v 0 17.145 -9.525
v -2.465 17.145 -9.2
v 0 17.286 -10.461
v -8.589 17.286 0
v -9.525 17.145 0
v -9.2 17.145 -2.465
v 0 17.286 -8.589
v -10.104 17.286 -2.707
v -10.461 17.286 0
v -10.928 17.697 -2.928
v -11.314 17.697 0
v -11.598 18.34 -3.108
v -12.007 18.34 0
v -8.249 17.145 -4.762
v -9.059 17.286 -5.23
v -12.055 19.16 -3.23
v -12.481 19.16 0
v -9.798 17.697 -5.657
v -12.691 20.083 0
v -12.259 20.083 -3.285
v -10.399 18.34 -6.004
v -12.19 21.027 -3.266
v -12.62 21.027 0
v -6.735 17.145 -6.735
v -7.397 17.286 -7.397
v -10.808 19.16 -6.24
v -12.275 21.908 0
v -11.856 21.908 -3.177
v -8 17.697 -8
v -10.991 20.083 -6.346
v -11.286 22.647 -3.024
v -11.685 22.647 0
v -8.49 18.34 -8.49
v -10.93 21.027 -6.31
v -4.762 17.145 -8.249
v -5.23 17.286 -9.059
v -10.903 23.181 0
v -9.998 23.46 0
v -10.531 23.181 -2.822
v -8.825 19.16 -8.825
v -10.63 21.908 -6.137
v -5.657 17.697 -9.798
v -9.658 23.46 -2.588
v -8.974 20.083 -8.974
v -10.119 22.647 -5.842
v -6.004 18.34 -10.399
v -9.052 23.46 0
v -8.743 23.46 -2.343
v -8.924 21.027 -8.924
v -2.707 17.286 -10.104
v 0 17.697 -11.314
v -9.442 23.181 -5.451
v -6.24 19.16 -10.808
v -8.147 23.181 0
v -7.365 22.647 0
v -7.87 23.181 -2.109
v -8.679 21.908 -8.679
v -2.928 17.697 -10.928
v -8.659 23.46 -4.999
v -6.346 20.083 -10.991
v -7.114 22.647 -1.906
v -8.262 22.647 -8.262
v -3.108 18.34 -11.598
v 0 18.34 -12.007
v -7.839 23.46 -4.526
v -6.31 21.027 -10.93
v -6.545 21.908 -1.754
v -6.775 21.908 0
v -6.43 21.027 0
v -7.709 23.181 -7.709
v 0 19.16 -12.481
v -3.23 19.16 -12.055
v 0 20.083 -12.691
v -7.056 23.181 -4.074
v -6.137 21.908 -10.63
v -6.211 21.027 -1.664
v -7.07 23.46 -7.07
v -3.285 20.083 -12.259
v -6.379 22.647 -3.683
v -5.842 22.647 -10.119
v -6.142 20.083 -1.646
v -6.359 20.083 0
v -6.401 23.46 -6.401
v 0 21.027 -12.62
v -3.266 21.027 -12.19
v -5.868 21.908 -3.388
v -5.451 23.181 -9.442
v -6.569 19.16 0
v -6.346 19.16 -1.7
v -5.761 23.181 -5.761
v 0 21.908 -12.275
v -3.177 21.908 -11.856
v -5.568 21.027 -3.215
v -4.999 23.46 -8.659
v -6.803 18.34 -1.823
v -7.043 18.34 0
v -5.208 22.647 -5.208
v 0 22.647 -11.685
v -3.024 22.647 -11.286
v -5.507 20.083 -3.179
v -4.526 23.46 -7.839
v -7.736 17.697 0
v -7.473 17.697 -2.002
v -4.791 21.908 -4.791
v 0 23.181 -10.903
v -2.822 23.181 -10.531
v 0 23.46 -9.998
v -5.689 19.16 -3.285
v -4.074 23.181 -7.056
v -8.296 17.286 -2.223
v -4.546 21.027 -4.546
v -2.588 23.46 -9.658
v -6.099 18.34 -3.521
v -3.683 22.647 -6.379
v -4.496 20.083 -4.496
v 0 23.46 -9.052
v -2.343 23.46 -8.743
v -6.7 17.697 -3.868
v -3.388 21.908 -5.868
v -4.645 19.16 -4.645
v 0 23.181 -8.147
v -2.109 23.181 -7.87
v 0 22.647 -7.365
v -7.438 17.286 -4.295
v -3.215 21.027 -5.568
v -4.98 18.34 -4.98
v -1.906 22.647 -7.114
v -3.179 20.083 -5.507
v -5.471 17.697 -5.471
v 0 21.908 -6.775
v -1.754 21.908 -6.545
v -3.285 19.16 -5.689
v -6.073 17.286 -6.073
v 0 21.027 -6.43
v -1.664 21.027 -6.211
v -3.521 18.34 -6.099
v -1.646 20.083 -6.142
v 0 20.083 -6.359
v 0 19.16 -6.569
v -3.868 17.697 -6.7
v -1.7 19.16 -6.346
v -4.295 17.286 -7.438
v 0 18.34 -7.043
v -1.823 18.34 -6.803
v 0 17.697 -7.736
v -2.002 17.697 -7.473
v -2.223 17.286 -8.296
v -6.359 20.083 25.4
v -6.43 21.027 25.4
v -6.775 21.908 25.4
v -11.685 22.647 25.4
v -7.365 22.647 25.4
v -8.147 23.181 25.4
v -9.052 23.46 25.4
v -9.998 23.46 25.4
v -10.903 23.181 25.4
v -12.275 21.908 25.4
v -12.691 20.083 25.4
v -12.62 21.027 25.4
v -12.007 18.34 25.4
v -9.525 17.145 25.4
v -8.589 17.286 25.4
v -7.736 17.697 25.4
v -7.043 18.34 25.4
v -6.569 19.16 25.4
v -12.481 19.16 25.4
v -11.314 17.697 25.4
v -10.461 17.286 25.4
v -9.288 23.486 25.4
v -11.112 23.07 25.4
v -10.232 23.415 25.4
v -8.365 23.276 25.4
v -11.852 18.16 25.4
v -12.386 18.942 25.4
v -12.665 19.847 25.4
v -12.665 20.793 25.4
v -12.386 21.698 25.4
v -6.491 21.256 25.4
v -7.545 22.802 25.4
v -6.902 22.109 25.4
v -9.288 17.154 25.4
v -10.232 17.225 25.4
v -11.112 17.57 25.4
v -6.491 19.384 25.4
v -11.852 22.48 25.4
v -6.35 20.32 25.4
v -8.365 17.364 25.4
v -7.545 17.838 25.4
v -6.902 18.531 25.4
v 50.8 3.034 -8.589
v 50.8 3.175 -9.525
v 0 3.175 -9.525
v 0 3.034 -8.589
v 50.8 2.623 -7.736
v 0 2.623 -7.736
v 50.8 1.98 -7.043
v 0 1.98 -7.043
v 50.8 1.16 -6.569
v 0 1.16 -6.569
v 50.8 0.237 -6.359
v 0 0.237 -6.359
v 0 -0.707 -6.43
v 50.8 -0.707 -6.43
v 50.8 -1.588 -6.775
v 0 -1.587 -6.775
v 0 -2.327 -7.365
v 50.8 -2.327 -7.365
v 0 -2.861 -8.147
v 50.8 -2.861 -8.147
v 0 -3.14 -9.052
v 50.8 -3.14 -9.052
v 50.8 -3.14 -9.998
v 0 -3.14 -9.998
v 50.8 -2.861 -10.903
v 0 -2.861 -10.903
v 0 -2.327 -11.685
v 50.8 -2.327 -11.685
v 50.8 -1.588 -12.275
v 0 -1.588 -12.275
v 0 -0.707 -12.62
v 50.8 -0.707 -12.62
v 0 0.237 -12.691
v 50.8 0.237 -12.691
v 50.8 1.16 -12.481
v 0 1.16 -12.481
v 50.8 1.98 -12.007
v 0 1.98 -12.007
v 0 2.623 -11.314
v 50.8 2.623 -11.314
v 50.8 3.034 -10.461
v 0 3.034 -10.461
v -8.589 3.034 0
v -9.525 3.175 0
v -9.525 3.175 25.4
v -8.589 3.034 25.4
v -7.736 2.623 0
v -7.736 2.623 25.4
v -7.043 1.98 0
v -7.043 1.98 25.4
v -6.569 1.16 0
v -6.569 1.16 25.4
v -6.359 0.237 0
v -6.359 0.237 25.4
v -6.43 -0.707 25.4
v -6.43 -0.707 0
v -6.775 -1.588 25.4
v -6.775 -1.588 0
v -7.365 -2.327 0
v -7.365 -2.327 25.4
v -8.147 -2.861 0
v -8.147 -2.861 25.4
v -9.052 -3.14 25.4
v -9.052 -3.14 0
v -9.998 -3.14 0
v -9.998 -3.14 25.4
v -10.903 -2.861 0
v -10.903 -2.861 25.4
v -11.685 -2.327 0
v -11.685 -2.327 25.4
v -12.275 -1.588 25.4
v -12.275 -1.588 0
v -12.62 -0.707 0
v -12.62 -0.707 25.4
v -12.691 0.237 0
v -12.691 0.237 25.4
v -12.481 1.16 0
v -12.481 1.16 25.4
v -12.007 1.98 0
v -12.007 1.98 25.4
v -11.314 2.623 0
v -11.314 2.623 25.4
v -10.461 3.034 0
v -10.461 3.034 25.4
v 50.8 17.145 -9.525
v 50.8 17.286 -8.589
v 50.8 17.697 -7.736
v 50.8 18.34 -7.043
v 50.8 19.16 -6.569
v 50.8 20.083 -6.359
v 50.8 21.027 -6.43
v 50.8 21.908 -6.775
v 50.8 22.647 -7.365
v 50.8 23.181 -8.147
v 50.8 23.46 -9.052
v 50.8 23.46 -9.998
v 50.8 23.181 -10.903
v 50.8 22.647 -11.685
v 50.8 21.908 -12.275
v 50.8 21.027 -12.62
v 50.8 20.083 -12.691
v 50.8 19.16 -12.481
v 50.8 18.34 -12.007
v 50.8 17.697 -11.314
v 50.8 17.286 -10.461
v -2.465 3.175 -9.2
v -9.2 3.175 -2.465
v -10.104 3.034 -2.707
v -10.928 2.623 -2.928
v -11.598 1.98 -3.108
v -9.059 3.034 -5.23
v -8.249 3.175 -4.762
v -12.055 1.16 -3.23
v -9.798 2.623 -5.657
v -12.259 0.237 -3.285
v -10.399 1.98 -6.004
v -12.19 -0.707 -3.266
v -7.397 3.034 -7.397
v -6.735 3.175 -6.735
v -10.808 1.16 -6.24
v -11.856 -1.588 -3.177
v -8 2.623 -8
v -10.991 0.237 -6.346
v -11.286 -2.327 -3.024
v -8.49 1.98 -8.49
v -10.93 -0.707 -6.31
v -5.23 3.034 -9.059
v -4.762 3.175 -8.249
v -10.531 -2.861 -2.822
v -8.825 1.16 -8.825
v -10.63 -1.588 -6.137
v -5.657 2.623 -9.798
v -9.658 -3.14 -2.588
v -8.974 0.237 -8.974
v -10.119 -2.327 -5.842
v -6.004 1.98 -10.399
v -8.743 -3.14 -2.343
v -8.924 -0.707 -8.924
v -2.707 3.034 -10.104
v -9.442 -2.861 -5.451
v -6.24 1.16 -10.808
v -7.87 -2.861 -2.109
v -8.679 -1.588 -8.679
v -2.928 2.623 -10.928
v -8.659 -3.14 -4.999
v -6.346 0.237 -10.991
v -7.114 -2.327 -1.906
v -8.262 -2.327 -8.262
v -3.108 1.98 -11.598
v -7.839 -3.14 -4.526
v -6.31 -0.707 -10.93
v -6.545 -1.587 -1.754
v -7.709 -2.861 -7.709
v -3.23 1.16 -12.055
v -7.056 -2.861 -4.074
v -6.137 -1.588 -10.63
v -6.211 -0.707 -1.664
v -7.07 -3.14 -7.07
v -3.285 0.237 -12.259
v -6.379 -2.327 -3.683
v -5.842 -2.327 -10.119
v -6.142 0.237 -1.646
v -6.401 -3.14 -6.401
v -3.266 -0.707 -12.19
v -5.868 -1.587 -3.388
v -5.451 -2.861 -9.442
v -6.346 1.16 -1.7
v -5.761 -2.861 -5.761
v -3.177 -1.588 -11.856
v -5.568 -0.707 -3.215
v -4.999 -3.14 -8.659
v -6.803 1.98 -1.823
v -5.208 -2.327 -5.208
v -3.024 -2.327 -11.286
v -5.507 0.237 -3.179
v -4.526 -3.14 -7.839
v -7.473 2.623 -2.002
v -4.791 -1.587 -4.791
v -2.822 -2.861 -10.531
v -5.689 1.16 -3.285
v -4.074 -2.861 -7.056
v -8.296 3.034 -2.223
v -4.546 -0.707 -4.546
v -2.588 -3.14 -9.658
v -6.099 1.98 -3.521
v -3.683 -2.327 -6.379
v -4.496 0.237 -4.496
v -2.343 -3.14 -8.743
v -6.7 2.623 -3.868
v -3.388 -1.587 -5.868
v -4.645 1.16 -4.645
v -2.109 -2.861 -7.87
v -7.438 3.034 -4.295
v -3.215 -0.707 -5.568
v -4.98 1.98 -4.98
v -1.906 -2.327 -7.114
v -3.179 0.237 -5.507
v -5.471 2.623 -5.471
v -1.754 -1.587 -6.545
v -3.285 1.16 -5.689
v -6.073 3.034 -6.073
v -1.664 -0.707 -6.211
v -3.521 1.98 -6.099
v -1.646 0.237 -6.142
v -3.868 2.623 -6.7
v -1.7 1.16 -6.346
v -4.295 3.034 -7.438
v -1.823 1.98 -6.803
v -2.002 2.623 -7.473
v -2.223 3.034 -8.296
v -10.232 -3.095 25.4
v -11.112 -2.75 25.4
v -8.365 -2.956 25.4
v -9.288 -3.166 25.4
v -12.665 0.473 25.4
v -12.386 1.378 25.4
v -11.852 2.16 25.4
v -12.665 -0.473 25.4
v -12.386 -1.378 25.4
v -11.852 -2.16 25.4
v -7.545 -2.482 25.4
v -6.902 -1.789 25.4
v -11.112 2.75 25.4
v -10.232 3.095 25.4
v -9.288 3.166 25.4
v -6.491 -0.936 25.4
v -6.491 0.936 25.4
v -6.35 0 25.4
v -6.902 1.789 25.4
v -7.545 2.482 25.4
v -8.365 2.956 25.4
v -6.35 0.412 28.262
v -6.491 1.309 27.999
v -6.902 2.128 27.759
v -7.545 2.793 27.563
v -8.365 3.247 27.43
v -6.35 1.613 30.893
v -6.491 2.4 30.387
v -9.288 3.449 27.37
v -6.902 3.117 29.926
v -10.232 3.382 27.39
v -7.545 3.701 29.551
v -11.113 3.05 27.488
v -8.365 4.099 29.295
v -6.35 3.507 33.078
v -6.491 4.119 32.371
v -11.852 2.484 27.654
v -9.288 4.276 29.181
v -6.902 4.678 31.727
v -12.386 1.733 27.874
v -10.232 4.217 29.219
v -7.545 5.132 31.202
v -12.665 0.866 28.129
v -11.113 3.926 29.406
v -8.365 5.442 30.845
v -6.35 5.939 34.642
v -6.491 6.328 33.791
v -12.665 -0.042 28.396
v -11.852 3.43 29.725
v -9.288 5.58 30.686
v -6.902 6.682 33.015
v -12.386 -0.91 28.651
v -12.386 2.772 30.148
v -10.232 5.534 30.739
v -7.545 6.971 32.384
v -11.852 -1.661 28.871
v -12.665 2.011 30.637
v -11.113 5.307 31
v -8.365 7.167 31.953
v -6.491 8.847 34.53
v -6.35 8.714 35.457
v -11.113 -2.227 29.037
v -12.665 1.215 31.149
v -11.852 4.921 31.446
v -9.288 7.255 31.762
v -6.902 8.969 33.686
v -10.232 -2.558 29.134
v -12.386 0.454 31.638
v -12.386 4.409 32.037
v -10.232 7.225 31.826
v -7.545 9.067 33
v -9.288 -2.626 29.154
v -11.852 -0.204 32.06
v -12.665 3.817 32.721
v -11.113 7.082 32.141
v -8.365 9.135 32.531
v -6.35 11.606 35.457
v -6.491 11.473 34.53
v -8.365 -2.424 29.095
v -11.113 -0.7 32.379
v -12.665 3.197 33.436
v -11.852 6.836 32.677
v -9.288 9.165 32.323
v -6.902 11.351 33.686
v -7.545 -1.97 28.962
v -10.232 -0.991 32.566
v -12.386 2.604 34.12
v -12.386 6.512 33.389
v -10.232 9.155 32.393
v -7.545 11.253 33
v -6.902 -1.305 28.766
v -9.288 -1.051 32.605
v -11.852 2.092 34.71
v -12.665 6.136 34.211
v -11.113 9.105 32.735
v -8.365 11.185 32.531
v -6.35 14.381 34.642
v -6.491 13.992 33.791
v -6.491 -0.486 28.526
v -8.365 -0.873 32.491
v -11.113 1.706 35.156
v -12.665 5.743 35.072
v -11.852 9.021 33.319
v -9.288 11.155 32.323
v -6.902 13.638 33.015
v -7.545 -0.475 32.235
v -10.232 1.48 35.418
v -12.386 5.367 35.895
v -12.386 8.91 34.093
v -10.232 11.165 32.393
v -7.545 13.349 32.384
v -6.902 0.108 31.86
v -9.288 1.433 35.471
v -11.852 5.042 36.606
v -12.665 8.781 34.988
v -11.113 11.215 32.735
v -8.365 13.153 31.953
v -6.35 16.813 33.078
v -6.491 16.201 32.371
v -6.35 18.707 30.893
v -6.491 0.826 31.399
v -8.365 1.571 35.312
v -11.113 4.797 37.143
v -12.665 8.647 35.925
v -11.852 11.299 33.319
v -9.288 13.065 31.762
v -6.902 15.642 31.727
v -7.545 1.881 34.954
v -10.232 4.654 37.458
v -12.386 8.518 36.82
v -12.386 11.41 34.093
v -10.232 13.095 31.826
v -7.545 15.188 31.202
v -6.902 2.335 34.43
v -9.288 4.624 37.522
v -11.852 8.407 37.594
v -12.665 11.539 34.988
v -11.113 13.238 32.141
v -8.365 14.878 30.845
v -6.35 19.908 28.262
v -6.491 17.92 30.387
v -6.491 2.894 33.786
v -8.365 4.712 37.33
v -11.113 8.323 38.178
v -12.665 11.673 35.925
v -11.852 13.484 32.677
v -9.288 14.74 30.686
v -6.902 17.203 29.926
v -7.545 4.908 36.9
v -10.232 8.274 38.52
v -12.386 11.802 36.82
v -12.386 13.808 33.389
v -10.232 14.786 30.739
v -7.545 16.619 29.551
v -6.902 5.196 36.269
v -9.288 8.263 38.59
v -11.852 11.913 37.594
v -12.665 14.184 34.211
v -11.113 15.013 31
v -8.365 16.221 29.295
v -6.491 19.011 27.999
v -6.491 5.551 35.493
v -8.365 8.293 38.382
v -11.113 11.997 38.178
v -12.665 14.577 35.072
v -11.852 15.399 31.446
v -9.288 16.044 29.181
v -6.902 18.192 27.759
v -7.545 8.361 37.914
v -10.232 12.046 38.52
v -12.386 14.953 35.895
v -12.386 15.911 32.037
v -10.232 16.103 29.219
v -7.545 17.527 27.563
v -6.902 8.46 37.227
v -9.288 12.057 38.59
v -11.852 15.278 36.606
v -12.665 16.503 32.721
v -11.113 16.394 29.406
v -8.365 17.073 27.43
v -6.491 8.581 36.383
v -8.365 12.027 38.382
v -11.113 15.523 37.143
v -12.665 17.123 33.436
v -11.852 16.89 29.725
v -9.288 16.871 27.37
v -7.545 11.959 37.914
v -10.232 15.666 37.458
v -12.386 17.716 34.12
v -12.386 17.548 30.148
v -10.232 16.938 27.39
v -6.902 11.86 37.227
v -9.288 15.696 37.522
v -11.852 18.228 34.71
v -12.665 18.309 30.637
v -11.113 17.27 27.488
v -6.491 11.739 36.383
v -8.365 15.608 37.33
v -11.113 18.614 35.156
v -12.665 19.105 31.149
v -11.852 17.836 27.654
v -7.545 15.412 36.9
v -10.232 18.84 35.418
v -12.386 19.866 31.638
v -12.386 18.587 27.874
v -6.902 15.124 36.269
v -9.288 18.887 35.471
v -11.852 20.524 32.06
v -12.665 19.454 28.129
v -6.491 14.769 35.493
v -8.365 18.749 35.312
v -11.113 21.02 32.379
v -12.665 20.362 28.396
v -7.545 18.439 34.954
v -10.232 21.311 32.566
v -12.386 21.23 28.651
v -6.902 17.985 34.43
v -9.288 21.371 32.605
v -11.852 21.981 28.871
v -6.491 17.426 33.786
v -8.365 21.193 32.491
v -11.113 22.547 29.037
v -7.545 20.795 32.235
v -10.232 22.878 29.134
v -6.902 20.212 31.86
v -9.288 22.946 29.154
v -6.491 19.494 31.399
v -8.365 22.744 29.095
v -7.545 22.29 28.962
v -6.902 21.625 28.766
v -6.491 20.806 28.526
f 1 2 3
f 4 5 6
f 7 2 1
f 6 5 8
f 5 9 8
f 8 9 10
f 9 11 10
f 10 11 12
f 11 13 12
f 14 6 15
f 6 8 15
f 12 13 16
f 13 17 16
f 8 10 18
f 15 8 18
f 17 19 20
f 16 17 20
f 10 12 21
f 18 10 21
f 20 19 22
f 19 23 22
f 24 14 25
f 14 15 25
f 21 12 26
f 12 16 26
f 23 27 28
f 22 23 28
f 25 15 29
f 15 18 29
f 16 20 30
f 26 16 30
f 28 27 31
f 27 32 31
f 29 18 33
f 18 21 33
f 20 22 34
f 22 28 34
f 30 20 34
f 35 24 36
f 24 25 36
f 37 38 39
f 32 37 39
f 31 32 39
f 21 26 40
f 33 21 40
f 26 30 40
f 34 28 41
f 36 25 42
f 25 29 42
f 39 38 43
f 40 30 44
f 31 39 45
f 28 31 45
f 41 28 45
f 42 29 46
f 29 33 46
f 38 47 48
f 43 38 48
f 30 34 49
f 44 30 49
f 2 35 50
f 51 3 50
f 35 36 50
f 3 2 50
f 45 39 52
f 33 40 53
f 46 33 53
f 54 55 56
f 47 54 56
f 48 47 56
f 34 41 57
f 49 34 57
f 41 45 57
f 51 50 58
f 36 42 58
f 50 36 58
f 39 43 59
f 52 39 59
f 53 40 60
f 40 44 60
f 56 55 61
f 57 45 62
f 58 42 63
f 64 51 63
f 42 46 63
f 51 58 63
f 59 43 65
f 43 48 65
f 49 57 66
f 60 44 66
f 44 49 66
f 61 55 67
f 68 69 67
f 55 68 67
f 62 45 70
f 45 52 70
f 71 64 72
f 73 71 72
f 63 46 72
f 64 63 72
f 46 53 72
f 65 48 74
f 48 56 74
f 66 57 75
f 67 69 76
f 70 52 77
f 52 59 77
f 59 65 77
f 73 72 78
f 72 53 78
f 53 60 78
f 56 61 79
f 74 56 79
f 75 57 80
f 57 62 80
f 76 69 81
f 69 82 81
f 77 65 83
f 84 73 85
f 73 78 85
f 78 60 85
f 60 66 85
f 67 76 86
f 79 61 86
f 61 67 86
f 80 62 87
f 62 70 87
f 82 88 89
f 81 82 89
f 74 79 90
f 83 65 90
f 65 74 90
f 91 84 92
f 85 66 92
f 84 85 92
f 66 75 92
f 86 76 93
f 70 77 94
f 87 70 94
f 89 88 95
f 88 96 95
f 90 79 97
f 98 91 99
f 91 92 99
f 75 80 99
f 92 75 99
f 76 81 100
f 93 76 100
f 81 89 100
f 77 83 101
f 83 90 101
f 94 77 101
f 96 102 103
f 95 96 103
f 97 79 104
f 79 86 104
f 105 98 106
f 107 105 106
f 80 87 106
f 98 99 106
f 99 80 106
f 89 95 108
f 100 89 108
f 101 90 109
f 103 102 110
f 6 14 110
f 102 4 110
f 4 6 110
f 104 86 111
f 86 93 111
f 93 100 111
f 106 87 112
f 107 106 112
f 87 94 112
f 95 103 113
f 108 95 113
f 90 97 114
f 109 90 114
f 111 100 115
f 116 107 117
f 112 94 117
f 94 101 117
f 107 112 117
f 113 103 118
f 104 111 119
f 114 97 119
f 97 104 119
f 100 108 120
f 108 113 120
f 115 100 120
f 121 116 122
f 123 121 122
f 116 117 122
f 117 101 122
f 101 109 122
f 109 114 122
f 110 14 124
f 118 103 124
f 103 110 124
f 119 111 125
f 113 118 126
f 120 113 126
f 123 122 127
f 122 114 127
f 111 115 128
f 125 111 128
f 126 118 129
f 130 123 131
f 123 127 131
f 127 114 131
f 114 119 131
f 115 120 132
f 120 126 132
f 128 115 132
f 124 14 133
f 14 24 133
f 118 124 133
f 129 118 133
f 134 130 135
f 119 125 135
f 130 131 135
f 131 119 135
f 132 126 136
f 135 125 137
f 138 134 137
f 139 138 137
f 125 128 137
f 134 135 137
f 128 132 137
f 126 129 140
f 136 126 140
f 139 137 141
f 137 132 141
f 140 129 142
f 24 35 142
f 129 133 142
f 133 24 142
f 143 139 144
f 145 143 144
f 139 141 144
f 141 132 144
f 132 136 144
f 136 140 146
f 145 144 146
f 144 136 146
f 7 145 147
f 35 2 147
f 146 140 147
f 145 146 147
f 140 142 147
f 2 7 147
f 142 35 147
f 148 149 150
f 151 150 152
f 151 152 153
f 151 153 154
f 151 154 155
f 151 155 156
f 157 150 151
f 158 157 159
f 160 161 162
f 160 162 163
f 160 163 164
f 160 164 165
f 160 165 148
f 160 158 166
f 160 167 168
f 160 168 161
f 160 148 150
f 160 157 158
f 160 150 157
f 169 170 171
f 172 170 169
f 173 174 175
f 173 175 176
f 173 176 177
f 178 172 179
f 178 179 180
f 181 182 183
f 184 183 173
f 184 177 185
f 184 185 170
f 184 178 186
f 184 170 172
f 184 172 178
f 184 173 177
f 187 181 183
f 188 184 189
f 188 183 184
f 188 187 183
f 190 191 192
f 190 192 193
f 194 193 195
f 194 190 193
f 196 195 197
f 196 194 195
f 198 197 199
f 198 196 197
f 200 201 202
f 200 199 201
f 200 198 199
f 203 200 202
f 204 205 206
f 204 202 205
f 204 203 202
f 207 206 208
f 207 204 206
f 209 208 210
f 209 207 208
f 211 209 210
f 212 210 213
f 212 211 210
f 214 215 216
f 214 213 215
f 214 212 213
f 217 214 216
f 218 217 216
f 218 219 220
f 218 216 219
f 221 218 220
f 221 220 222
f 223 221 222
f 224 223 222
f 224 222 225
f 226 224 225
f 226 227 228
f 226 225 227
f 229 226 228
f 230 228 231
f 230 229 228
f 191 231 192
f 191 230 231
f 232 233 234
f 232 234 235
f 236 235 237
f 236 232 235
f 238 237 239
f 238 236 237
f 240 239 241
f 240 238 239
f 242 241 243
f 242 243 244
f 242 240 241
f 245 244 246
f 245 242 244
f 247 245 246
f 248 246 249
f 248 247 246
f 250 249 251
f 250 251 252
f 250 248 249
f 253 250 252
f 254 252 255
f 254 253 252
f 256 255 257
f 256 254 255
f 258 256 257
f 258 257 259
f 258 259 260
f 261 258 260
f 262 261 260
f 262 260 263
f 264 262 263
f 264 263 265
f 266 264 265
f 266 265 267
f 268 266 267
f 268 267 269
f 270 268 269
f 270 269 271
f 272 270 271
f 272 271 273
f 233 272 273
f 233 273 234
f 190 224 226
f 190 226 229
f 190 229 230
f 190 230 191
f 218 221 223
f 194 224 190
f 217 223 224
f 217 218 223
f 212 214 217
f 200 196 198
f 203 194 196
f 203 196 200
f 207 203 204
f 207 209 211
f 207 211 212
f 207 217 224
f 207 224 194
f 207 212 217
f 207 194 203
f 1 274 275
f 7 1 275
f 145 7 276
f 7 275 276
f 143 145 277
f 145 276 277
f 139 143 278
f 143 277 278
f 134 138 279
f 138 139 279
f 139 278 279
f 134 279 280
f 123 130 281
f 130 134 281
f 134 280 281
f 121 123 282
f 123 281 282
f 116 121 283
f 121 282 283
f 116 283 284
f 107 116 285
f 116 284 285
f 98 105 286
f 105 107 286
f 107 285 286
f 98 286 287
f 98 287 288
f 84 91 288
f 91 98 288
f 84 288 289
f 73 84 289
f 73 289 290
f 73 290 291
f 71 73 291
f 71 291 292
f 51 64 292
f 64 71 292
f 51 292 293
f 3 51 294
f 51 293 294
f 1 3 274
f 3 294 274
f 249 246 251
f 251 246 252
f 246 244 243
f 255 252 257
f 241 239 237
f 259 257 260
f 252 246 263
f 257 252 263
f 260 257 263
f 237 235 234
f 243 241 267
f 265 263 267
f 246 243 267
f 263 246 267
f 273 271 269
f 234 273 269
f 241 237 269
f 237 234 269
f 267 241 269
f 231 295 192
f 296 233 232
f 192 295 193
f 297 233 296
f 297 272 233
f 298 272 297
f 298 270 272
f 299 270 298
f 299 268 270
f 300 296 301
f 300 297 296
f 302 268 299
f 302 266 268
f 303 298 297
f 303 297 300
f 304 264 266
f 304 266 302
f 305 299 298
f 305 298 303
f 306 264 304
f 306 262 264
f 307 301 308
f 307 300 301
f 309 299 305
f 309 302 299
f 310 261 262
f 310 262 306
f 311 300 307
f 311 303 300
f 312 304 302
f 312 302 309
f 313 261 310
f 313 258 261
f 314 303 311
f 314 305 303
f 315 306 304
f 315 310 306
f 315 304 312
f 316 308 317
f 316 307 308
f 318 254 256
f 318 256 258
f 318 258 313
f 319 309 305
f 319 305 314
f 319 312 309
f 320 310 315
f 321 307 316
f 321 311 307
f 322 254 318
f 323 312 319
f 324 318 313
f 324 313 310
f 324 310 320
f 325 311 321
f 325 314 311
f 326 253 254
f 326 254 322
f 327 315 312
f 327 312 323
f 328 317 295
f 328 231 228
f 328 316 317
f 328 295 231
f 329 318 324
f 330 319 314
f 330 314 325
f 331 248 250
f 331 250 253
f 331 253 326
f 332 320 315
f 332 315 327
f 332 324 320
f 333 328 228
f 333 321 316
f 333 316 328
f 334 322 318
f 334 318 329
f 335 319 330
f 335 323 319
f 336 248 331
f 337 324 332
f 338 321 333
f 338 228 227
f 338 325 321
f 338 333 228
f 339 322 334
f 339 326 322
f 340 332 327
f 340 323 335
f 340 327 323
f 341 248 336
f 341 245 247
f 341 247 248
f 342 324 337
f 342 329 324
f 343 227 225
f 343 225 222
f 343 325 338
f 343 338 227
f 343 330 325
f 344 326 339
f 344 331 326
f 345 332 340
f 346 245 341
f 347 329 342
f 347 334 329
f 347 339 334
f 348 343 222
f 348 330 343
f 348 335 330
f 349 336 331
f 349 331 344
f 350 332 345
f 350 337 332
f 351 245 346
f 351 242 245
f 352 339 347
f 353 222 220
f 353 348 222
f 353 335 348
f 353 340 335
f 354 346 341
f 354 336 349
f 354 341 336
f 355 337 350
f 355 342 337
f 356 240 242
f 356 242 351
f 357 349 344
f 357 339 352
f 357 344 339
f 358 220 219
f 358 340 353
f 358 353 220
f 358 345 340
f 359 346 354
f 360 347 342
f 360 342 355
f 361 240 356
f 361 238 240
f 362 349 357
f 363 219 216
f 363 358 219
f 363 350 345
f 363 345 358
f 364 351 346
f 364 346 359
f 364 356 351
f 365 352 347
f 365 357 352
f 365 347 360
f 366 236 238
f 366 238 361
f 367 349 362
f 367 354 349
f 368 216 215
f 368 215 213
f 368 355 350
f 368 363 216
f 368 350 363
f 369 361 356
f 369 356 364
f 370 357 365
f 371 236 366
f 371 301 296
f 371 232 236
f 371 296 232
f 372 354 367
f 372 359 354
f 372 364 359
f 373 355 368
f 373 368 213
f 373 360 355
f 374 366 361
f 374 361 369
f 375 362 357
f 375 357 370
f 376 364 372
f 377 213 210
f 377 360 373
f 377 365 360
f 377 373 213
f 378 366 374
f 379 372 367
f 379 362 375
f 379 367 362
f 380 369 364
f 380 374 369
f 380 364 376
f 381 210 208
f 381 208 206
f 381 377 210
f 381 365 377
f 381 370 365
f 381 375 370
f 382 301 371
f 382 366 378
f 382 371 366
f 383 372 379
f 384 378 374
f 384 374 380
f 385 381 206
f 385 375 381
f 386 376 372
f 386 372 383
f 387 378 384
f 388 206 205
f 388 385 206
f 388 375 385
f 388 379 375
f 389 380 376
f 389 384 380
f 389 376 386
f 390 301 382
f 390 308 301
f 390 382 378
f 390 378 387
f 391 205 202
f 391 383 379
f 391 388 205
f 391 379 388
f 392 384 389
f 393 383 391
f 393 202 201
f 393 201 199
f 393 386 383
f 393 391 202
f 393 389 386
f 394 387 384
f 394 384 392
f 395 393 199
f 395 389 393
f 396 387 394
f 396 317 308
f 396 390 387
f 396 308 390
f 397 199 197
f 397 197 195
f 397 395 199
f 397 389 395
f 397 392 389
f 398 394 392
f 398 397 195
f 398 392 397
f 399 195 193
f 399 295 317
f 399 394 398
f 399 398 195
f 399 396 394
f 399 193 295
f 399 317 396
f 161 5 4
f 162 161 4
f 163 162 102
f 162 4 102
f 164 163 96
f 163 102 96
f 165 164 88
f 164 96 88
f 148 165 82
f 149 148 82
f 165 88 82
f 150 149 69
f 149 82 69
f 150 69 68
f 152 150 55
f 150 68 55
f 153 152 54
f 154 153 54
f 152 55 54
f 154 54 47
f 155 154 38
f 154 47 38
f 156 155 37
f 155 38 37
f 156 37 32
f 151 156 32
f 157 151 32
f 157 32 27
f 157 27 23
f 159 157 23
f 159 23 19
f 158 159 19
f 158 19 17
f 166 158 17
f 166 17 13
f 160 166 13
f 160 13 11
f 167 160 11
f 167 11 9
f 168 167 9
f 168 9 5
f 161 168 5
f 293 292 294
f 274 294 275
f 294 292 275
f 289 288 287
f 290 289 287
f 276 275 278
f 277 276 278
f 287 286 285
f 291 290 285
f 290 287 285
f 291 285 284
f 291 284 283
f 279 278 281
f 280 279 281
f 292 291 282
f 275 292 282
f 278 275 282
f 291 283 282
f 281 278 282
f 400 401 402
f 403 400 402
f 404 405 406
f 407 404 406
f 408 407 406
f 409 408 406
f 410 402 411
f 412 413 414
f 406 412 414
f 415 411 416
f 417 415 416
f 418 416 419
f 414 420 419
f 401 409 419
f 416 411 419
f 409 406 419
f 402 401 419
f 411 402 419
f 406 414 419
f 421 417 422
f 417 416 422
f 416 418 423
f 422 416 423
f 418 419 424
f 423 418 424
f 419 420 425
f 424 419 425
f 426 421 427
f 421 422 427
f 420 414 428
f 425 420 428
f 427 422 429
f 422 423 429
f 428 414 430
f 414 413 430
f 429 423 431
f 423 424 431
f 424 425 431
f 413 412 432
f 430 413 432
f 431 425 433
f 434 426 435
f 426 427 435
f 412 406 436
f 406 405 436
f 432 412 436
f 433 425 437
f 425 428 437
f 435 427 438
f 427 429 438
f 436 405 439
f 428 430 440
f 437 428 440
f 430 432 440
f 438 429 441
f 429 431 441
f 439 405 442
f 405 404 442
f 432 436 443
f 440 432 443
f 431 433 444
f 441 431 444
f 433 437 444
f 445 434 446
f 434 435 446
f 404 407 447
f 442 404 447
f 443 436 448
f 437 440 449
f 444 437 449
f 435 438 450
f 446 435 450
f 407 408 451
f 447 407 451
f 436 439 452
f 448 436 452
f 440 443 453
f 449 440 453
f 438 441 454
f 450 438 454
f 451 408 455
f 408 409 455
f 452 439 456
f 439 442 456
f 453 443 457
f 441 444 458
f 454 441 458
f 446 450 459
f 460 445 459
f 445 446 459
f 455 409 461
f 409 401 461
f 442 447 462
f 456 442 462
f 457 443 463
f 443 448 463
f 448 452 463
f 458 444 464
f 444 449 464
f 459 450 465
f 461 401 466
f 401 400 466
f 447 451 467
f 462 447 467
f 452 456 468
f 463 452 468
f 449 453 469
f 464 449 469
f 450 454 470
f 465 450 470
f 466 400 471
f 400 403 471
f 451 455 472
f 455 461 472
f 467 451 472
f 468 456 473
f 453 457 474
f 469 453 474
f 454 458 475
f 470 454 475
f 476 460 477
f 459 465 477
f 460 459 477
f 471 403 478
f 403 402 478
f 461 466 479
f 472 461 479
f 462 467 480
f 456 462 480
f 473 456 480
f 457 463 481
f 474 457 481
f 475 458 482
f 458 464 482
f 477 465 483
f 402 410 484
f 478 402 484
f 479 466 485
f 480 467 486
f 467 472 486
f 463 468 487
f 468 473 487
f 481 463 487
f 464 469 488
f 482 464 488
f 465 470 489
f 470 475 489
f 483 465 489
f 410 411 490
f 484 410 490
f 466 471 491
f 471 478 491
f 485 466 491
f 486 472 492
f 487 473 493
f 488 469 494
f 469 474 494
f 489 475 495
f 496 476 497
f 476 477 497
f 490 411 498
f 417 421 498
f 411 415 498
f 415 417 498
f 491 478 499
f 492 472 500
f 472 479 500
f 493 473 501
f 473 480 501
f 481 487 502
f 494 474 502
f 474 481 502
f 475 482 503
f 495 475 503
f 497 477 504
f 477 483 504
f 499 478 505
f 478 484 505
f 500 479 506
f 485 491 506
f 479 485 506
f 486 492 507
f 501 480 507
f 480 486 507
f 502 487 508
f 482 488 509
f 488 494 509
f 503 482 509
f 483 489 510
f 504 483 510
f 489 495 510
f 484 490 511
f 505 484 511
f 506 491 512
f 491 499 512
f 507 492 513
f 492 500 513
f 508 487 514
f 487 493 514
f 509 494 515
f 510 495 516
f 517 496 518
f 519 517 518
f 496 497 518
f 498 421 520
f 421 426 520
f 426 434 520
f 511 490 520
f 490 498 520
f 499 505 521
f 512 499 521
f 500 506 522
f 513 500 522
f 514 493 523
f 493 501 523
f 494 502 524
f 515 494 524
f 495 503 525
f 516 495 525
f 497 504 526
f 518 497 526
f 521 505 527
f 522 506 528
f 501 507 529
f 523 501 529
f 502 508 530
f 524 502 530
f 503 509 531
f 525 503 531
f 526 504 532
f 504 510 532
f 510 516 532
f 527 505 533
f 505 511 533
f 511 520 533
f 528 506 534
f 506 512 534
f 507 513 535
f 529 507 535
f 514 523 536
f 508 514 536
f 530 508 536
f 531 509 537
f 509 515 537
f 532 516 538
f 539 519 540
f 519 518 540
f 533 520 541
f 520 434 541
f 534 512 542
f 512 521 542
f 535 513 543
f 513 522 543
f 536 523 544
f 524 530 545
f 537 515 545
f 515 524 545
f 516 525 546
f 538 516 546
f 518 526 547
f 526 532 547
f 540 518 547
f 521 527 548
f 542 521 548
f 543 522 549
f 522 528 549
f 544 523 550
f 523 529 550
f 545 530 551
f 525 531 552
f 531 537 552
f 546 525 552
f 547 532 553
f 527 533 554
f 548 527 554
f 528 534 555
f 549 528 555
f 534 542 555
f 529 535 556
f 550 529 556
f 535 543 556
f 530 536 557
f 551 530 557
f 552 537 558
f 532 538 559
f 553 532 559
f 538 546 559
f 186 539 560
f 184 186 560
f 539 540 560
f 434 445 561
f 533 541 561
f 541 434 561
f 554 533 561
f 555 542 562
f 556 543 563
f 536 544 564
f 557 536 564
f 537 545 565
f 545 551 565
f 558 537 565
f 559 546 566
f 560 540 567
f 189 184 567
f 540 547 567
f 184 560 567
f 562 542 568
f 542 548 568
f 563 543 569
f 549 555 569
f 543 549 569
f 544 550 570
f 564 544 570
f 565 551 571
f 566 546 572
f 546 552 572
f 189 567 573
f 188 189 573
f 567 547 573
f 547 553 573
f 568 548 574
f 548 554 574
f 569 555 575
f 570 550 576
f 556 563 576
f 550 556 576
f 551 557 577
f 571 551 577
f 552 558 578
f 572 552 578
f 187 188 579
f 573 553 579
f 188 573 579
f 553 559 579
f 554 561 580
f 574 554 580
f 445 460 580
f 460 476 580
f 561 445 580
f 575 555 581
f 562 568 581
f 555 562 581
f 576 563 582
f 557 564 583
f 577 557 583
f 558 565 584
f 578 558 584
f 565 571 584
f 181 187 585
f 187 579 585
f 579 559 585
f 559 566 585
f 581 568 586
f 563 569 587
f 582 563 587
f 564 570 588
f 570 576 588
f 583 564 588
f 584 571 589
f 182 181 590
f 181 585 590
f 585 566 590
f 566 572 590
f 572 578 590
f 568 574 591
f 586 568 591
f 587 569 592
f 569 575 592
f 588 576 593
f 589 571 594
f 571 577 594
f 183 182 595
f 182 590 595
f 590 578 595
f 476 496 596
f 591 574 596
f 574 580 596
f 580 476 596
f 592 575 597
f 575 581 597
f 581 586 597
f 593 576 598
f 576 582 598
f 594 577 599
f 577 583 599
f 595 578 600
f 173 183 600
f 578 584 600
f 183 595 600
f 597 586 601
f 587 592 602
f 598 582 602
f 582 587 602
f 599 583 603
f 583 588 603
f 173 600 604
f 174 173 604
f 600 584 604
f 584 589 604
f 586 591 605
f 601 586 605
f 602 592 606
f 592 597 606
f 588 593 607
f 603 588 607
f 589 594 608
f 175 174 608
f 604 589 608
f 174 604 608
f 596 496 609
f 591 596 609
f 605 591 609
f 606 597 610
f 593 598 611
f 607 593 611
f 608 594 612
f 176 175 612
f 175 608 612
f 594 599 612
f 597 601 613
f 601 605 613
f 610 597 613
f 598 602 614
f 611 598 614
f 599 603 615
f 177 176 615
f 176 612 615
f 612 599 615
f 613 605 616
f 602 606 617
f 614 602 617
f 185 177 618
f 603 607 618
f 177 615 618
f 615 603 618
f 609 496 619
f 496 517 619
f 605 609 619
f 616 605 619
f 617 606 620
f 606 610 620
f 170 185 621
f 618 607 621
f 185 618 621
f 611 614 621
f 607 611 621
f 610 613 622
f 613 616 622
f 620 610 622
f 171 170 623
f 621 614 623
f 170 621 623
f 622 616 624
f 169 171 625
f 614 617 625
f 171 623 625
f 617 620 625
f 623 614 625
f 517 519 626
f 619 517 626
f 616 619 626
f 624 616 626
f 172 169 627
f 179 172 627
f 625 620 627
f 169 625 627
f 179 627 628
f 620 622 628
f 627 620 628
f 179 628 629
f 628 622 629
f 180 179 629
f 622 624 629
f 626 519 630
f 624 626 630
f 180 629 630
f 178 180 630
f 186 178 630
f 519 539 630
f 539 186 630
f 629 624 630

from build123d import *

# Parameters (mm, degrees)
F2_R     = 3.175
F6_R     = 3.175
F7_ANGLE = 180


with BuildPart() as f3:
    # F3: sweep along a path in F0
    with BuildLine(Plane.XZ) as f3_path:
        Line((-9.525, 25.4), (-9.525, 0))
        ThreePointArc((-9.525, 0), (-6.7351920908, -6.7351920908), (0, -9.525))
        Line((0, -9.525), (50.8, -9.525))
    # F2 (on plane+point) → F3 (sweep)
    with BuildSketch(Plane.YZ.offset(50.8)):
        with Locations((0, -9.525)):
            Circle(F2_R)
    sweep(path=f3_path.line)


with BuildPart() as f5_1:
    # F5: instance of F3
    add(f3.part.mirror(Plane.XZ.offset(-10.16)))


with BuildPart() as f7:
    # F6 (on face) → F7 (revolve)
    with BuildSketch(Plane.XY.offset(25.4)):
        with Locations((-9.525, 0)):
            Circle(F6_R)
    revolve(axis=Axis((-28.8036, 10.16, 25.4), (-1, 0, 0)), revolution_arc=F7_ANGLE)


solid = Compound([f3.part, f5_1.part, f7.part])
